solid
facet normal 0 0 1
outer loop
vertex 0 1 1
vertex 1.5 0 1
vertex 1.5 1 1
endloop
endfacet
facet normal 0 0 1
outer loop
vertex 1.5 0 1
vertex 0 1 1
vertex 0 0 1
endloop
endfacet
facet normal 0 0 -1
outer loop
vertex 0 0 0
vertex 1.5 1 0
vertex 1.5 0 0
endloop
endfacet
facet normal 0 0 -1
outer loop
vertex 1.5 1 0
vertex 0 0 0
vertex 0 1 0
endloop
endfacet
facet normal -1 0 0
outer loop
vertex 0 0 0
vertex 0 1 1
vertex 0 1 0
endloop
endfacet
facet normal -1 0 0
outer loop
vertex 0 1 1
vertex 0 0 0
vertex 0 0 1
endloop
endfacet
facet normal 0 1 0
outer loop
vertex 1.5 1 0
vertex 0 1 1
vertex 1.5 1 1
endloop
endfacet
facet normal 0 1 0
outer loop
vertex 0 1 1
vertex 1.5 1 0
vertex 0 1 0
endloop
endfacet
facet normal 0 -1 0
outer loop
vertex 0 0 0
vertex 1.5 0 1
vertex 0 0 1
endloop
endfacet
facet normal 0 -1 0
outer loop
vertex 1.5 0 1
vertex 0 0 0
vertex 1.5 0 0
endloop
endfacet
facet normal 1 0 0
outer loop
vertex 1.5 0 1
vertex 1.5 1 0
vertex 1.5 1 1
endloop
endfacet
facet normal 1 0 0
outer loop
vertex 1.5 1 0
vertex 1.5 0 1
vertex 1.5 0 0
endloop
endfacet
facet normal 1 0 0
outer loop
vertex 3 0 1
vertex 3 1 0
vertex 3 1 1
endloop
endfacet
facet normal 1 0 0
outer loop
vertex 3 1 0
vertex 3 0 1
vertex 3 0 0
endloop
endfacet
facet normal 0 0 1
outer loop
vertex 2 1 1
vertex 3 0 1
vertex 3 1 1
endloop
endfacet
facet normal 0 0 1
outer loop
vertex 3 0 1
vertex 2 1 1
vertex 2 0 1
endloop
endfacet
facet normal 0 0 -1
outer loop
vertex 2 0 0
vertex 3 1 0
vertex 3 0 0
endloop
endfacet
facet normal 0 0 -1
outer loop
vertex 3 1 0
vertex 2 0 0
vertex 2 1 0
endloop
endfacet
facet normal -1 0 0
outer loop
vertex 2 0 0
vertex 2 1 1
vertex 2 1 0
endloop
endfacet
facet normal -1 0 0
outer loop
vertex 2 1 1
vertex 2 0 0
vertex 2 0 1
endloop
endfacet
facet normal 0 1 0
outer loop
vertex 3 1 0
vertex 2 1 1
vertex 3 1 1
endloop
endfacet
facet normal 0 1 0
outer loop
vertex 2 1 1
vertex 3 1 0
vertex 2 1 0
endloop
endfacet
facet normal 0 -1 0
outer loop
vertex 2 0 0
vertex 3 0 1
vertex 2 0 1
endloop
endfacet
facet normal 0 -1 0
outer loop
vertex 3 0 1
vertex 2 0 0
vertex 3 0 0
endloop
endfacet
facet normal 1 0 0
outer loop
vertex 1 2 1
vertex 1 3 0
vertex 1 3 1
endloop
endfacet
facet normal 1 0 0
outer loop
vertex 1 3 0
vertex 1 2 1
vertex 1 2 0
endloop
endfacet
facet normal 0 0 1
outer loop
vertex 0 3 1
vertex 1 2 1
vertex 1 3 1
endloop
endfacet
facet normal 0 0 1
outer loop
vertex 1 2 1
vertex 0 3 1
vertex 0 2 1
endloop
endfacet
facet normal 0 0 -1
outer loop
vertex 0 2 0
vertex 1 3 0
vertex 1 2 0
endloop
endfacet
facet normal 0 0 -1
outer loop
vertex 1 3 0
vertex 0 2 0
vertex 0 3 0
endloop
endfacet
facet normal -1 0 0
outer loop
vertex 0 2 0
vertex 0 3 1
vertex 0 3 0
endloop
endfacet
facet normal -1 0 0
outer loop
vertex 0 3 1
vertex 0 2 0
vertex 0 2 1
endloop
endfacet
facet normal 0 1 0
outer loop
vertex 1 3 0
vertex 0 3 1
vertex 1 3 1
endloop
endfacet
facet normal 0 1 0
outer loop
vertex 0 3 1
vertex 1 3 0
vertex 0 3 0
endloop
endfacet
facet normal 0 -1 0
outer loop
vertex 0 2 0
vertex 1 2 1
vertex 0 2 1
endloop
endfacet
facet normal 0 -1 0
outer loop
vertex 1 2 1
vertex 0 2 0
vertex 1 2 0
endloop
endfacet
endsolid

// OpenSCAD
color("red")
  cube();

translate([0.5, 0, 0])
  color("green")
    cube();

color("#0000FF44")
  translate([2, 0, 0])
    cube();

translate([0, 2, 0])
    cube();
